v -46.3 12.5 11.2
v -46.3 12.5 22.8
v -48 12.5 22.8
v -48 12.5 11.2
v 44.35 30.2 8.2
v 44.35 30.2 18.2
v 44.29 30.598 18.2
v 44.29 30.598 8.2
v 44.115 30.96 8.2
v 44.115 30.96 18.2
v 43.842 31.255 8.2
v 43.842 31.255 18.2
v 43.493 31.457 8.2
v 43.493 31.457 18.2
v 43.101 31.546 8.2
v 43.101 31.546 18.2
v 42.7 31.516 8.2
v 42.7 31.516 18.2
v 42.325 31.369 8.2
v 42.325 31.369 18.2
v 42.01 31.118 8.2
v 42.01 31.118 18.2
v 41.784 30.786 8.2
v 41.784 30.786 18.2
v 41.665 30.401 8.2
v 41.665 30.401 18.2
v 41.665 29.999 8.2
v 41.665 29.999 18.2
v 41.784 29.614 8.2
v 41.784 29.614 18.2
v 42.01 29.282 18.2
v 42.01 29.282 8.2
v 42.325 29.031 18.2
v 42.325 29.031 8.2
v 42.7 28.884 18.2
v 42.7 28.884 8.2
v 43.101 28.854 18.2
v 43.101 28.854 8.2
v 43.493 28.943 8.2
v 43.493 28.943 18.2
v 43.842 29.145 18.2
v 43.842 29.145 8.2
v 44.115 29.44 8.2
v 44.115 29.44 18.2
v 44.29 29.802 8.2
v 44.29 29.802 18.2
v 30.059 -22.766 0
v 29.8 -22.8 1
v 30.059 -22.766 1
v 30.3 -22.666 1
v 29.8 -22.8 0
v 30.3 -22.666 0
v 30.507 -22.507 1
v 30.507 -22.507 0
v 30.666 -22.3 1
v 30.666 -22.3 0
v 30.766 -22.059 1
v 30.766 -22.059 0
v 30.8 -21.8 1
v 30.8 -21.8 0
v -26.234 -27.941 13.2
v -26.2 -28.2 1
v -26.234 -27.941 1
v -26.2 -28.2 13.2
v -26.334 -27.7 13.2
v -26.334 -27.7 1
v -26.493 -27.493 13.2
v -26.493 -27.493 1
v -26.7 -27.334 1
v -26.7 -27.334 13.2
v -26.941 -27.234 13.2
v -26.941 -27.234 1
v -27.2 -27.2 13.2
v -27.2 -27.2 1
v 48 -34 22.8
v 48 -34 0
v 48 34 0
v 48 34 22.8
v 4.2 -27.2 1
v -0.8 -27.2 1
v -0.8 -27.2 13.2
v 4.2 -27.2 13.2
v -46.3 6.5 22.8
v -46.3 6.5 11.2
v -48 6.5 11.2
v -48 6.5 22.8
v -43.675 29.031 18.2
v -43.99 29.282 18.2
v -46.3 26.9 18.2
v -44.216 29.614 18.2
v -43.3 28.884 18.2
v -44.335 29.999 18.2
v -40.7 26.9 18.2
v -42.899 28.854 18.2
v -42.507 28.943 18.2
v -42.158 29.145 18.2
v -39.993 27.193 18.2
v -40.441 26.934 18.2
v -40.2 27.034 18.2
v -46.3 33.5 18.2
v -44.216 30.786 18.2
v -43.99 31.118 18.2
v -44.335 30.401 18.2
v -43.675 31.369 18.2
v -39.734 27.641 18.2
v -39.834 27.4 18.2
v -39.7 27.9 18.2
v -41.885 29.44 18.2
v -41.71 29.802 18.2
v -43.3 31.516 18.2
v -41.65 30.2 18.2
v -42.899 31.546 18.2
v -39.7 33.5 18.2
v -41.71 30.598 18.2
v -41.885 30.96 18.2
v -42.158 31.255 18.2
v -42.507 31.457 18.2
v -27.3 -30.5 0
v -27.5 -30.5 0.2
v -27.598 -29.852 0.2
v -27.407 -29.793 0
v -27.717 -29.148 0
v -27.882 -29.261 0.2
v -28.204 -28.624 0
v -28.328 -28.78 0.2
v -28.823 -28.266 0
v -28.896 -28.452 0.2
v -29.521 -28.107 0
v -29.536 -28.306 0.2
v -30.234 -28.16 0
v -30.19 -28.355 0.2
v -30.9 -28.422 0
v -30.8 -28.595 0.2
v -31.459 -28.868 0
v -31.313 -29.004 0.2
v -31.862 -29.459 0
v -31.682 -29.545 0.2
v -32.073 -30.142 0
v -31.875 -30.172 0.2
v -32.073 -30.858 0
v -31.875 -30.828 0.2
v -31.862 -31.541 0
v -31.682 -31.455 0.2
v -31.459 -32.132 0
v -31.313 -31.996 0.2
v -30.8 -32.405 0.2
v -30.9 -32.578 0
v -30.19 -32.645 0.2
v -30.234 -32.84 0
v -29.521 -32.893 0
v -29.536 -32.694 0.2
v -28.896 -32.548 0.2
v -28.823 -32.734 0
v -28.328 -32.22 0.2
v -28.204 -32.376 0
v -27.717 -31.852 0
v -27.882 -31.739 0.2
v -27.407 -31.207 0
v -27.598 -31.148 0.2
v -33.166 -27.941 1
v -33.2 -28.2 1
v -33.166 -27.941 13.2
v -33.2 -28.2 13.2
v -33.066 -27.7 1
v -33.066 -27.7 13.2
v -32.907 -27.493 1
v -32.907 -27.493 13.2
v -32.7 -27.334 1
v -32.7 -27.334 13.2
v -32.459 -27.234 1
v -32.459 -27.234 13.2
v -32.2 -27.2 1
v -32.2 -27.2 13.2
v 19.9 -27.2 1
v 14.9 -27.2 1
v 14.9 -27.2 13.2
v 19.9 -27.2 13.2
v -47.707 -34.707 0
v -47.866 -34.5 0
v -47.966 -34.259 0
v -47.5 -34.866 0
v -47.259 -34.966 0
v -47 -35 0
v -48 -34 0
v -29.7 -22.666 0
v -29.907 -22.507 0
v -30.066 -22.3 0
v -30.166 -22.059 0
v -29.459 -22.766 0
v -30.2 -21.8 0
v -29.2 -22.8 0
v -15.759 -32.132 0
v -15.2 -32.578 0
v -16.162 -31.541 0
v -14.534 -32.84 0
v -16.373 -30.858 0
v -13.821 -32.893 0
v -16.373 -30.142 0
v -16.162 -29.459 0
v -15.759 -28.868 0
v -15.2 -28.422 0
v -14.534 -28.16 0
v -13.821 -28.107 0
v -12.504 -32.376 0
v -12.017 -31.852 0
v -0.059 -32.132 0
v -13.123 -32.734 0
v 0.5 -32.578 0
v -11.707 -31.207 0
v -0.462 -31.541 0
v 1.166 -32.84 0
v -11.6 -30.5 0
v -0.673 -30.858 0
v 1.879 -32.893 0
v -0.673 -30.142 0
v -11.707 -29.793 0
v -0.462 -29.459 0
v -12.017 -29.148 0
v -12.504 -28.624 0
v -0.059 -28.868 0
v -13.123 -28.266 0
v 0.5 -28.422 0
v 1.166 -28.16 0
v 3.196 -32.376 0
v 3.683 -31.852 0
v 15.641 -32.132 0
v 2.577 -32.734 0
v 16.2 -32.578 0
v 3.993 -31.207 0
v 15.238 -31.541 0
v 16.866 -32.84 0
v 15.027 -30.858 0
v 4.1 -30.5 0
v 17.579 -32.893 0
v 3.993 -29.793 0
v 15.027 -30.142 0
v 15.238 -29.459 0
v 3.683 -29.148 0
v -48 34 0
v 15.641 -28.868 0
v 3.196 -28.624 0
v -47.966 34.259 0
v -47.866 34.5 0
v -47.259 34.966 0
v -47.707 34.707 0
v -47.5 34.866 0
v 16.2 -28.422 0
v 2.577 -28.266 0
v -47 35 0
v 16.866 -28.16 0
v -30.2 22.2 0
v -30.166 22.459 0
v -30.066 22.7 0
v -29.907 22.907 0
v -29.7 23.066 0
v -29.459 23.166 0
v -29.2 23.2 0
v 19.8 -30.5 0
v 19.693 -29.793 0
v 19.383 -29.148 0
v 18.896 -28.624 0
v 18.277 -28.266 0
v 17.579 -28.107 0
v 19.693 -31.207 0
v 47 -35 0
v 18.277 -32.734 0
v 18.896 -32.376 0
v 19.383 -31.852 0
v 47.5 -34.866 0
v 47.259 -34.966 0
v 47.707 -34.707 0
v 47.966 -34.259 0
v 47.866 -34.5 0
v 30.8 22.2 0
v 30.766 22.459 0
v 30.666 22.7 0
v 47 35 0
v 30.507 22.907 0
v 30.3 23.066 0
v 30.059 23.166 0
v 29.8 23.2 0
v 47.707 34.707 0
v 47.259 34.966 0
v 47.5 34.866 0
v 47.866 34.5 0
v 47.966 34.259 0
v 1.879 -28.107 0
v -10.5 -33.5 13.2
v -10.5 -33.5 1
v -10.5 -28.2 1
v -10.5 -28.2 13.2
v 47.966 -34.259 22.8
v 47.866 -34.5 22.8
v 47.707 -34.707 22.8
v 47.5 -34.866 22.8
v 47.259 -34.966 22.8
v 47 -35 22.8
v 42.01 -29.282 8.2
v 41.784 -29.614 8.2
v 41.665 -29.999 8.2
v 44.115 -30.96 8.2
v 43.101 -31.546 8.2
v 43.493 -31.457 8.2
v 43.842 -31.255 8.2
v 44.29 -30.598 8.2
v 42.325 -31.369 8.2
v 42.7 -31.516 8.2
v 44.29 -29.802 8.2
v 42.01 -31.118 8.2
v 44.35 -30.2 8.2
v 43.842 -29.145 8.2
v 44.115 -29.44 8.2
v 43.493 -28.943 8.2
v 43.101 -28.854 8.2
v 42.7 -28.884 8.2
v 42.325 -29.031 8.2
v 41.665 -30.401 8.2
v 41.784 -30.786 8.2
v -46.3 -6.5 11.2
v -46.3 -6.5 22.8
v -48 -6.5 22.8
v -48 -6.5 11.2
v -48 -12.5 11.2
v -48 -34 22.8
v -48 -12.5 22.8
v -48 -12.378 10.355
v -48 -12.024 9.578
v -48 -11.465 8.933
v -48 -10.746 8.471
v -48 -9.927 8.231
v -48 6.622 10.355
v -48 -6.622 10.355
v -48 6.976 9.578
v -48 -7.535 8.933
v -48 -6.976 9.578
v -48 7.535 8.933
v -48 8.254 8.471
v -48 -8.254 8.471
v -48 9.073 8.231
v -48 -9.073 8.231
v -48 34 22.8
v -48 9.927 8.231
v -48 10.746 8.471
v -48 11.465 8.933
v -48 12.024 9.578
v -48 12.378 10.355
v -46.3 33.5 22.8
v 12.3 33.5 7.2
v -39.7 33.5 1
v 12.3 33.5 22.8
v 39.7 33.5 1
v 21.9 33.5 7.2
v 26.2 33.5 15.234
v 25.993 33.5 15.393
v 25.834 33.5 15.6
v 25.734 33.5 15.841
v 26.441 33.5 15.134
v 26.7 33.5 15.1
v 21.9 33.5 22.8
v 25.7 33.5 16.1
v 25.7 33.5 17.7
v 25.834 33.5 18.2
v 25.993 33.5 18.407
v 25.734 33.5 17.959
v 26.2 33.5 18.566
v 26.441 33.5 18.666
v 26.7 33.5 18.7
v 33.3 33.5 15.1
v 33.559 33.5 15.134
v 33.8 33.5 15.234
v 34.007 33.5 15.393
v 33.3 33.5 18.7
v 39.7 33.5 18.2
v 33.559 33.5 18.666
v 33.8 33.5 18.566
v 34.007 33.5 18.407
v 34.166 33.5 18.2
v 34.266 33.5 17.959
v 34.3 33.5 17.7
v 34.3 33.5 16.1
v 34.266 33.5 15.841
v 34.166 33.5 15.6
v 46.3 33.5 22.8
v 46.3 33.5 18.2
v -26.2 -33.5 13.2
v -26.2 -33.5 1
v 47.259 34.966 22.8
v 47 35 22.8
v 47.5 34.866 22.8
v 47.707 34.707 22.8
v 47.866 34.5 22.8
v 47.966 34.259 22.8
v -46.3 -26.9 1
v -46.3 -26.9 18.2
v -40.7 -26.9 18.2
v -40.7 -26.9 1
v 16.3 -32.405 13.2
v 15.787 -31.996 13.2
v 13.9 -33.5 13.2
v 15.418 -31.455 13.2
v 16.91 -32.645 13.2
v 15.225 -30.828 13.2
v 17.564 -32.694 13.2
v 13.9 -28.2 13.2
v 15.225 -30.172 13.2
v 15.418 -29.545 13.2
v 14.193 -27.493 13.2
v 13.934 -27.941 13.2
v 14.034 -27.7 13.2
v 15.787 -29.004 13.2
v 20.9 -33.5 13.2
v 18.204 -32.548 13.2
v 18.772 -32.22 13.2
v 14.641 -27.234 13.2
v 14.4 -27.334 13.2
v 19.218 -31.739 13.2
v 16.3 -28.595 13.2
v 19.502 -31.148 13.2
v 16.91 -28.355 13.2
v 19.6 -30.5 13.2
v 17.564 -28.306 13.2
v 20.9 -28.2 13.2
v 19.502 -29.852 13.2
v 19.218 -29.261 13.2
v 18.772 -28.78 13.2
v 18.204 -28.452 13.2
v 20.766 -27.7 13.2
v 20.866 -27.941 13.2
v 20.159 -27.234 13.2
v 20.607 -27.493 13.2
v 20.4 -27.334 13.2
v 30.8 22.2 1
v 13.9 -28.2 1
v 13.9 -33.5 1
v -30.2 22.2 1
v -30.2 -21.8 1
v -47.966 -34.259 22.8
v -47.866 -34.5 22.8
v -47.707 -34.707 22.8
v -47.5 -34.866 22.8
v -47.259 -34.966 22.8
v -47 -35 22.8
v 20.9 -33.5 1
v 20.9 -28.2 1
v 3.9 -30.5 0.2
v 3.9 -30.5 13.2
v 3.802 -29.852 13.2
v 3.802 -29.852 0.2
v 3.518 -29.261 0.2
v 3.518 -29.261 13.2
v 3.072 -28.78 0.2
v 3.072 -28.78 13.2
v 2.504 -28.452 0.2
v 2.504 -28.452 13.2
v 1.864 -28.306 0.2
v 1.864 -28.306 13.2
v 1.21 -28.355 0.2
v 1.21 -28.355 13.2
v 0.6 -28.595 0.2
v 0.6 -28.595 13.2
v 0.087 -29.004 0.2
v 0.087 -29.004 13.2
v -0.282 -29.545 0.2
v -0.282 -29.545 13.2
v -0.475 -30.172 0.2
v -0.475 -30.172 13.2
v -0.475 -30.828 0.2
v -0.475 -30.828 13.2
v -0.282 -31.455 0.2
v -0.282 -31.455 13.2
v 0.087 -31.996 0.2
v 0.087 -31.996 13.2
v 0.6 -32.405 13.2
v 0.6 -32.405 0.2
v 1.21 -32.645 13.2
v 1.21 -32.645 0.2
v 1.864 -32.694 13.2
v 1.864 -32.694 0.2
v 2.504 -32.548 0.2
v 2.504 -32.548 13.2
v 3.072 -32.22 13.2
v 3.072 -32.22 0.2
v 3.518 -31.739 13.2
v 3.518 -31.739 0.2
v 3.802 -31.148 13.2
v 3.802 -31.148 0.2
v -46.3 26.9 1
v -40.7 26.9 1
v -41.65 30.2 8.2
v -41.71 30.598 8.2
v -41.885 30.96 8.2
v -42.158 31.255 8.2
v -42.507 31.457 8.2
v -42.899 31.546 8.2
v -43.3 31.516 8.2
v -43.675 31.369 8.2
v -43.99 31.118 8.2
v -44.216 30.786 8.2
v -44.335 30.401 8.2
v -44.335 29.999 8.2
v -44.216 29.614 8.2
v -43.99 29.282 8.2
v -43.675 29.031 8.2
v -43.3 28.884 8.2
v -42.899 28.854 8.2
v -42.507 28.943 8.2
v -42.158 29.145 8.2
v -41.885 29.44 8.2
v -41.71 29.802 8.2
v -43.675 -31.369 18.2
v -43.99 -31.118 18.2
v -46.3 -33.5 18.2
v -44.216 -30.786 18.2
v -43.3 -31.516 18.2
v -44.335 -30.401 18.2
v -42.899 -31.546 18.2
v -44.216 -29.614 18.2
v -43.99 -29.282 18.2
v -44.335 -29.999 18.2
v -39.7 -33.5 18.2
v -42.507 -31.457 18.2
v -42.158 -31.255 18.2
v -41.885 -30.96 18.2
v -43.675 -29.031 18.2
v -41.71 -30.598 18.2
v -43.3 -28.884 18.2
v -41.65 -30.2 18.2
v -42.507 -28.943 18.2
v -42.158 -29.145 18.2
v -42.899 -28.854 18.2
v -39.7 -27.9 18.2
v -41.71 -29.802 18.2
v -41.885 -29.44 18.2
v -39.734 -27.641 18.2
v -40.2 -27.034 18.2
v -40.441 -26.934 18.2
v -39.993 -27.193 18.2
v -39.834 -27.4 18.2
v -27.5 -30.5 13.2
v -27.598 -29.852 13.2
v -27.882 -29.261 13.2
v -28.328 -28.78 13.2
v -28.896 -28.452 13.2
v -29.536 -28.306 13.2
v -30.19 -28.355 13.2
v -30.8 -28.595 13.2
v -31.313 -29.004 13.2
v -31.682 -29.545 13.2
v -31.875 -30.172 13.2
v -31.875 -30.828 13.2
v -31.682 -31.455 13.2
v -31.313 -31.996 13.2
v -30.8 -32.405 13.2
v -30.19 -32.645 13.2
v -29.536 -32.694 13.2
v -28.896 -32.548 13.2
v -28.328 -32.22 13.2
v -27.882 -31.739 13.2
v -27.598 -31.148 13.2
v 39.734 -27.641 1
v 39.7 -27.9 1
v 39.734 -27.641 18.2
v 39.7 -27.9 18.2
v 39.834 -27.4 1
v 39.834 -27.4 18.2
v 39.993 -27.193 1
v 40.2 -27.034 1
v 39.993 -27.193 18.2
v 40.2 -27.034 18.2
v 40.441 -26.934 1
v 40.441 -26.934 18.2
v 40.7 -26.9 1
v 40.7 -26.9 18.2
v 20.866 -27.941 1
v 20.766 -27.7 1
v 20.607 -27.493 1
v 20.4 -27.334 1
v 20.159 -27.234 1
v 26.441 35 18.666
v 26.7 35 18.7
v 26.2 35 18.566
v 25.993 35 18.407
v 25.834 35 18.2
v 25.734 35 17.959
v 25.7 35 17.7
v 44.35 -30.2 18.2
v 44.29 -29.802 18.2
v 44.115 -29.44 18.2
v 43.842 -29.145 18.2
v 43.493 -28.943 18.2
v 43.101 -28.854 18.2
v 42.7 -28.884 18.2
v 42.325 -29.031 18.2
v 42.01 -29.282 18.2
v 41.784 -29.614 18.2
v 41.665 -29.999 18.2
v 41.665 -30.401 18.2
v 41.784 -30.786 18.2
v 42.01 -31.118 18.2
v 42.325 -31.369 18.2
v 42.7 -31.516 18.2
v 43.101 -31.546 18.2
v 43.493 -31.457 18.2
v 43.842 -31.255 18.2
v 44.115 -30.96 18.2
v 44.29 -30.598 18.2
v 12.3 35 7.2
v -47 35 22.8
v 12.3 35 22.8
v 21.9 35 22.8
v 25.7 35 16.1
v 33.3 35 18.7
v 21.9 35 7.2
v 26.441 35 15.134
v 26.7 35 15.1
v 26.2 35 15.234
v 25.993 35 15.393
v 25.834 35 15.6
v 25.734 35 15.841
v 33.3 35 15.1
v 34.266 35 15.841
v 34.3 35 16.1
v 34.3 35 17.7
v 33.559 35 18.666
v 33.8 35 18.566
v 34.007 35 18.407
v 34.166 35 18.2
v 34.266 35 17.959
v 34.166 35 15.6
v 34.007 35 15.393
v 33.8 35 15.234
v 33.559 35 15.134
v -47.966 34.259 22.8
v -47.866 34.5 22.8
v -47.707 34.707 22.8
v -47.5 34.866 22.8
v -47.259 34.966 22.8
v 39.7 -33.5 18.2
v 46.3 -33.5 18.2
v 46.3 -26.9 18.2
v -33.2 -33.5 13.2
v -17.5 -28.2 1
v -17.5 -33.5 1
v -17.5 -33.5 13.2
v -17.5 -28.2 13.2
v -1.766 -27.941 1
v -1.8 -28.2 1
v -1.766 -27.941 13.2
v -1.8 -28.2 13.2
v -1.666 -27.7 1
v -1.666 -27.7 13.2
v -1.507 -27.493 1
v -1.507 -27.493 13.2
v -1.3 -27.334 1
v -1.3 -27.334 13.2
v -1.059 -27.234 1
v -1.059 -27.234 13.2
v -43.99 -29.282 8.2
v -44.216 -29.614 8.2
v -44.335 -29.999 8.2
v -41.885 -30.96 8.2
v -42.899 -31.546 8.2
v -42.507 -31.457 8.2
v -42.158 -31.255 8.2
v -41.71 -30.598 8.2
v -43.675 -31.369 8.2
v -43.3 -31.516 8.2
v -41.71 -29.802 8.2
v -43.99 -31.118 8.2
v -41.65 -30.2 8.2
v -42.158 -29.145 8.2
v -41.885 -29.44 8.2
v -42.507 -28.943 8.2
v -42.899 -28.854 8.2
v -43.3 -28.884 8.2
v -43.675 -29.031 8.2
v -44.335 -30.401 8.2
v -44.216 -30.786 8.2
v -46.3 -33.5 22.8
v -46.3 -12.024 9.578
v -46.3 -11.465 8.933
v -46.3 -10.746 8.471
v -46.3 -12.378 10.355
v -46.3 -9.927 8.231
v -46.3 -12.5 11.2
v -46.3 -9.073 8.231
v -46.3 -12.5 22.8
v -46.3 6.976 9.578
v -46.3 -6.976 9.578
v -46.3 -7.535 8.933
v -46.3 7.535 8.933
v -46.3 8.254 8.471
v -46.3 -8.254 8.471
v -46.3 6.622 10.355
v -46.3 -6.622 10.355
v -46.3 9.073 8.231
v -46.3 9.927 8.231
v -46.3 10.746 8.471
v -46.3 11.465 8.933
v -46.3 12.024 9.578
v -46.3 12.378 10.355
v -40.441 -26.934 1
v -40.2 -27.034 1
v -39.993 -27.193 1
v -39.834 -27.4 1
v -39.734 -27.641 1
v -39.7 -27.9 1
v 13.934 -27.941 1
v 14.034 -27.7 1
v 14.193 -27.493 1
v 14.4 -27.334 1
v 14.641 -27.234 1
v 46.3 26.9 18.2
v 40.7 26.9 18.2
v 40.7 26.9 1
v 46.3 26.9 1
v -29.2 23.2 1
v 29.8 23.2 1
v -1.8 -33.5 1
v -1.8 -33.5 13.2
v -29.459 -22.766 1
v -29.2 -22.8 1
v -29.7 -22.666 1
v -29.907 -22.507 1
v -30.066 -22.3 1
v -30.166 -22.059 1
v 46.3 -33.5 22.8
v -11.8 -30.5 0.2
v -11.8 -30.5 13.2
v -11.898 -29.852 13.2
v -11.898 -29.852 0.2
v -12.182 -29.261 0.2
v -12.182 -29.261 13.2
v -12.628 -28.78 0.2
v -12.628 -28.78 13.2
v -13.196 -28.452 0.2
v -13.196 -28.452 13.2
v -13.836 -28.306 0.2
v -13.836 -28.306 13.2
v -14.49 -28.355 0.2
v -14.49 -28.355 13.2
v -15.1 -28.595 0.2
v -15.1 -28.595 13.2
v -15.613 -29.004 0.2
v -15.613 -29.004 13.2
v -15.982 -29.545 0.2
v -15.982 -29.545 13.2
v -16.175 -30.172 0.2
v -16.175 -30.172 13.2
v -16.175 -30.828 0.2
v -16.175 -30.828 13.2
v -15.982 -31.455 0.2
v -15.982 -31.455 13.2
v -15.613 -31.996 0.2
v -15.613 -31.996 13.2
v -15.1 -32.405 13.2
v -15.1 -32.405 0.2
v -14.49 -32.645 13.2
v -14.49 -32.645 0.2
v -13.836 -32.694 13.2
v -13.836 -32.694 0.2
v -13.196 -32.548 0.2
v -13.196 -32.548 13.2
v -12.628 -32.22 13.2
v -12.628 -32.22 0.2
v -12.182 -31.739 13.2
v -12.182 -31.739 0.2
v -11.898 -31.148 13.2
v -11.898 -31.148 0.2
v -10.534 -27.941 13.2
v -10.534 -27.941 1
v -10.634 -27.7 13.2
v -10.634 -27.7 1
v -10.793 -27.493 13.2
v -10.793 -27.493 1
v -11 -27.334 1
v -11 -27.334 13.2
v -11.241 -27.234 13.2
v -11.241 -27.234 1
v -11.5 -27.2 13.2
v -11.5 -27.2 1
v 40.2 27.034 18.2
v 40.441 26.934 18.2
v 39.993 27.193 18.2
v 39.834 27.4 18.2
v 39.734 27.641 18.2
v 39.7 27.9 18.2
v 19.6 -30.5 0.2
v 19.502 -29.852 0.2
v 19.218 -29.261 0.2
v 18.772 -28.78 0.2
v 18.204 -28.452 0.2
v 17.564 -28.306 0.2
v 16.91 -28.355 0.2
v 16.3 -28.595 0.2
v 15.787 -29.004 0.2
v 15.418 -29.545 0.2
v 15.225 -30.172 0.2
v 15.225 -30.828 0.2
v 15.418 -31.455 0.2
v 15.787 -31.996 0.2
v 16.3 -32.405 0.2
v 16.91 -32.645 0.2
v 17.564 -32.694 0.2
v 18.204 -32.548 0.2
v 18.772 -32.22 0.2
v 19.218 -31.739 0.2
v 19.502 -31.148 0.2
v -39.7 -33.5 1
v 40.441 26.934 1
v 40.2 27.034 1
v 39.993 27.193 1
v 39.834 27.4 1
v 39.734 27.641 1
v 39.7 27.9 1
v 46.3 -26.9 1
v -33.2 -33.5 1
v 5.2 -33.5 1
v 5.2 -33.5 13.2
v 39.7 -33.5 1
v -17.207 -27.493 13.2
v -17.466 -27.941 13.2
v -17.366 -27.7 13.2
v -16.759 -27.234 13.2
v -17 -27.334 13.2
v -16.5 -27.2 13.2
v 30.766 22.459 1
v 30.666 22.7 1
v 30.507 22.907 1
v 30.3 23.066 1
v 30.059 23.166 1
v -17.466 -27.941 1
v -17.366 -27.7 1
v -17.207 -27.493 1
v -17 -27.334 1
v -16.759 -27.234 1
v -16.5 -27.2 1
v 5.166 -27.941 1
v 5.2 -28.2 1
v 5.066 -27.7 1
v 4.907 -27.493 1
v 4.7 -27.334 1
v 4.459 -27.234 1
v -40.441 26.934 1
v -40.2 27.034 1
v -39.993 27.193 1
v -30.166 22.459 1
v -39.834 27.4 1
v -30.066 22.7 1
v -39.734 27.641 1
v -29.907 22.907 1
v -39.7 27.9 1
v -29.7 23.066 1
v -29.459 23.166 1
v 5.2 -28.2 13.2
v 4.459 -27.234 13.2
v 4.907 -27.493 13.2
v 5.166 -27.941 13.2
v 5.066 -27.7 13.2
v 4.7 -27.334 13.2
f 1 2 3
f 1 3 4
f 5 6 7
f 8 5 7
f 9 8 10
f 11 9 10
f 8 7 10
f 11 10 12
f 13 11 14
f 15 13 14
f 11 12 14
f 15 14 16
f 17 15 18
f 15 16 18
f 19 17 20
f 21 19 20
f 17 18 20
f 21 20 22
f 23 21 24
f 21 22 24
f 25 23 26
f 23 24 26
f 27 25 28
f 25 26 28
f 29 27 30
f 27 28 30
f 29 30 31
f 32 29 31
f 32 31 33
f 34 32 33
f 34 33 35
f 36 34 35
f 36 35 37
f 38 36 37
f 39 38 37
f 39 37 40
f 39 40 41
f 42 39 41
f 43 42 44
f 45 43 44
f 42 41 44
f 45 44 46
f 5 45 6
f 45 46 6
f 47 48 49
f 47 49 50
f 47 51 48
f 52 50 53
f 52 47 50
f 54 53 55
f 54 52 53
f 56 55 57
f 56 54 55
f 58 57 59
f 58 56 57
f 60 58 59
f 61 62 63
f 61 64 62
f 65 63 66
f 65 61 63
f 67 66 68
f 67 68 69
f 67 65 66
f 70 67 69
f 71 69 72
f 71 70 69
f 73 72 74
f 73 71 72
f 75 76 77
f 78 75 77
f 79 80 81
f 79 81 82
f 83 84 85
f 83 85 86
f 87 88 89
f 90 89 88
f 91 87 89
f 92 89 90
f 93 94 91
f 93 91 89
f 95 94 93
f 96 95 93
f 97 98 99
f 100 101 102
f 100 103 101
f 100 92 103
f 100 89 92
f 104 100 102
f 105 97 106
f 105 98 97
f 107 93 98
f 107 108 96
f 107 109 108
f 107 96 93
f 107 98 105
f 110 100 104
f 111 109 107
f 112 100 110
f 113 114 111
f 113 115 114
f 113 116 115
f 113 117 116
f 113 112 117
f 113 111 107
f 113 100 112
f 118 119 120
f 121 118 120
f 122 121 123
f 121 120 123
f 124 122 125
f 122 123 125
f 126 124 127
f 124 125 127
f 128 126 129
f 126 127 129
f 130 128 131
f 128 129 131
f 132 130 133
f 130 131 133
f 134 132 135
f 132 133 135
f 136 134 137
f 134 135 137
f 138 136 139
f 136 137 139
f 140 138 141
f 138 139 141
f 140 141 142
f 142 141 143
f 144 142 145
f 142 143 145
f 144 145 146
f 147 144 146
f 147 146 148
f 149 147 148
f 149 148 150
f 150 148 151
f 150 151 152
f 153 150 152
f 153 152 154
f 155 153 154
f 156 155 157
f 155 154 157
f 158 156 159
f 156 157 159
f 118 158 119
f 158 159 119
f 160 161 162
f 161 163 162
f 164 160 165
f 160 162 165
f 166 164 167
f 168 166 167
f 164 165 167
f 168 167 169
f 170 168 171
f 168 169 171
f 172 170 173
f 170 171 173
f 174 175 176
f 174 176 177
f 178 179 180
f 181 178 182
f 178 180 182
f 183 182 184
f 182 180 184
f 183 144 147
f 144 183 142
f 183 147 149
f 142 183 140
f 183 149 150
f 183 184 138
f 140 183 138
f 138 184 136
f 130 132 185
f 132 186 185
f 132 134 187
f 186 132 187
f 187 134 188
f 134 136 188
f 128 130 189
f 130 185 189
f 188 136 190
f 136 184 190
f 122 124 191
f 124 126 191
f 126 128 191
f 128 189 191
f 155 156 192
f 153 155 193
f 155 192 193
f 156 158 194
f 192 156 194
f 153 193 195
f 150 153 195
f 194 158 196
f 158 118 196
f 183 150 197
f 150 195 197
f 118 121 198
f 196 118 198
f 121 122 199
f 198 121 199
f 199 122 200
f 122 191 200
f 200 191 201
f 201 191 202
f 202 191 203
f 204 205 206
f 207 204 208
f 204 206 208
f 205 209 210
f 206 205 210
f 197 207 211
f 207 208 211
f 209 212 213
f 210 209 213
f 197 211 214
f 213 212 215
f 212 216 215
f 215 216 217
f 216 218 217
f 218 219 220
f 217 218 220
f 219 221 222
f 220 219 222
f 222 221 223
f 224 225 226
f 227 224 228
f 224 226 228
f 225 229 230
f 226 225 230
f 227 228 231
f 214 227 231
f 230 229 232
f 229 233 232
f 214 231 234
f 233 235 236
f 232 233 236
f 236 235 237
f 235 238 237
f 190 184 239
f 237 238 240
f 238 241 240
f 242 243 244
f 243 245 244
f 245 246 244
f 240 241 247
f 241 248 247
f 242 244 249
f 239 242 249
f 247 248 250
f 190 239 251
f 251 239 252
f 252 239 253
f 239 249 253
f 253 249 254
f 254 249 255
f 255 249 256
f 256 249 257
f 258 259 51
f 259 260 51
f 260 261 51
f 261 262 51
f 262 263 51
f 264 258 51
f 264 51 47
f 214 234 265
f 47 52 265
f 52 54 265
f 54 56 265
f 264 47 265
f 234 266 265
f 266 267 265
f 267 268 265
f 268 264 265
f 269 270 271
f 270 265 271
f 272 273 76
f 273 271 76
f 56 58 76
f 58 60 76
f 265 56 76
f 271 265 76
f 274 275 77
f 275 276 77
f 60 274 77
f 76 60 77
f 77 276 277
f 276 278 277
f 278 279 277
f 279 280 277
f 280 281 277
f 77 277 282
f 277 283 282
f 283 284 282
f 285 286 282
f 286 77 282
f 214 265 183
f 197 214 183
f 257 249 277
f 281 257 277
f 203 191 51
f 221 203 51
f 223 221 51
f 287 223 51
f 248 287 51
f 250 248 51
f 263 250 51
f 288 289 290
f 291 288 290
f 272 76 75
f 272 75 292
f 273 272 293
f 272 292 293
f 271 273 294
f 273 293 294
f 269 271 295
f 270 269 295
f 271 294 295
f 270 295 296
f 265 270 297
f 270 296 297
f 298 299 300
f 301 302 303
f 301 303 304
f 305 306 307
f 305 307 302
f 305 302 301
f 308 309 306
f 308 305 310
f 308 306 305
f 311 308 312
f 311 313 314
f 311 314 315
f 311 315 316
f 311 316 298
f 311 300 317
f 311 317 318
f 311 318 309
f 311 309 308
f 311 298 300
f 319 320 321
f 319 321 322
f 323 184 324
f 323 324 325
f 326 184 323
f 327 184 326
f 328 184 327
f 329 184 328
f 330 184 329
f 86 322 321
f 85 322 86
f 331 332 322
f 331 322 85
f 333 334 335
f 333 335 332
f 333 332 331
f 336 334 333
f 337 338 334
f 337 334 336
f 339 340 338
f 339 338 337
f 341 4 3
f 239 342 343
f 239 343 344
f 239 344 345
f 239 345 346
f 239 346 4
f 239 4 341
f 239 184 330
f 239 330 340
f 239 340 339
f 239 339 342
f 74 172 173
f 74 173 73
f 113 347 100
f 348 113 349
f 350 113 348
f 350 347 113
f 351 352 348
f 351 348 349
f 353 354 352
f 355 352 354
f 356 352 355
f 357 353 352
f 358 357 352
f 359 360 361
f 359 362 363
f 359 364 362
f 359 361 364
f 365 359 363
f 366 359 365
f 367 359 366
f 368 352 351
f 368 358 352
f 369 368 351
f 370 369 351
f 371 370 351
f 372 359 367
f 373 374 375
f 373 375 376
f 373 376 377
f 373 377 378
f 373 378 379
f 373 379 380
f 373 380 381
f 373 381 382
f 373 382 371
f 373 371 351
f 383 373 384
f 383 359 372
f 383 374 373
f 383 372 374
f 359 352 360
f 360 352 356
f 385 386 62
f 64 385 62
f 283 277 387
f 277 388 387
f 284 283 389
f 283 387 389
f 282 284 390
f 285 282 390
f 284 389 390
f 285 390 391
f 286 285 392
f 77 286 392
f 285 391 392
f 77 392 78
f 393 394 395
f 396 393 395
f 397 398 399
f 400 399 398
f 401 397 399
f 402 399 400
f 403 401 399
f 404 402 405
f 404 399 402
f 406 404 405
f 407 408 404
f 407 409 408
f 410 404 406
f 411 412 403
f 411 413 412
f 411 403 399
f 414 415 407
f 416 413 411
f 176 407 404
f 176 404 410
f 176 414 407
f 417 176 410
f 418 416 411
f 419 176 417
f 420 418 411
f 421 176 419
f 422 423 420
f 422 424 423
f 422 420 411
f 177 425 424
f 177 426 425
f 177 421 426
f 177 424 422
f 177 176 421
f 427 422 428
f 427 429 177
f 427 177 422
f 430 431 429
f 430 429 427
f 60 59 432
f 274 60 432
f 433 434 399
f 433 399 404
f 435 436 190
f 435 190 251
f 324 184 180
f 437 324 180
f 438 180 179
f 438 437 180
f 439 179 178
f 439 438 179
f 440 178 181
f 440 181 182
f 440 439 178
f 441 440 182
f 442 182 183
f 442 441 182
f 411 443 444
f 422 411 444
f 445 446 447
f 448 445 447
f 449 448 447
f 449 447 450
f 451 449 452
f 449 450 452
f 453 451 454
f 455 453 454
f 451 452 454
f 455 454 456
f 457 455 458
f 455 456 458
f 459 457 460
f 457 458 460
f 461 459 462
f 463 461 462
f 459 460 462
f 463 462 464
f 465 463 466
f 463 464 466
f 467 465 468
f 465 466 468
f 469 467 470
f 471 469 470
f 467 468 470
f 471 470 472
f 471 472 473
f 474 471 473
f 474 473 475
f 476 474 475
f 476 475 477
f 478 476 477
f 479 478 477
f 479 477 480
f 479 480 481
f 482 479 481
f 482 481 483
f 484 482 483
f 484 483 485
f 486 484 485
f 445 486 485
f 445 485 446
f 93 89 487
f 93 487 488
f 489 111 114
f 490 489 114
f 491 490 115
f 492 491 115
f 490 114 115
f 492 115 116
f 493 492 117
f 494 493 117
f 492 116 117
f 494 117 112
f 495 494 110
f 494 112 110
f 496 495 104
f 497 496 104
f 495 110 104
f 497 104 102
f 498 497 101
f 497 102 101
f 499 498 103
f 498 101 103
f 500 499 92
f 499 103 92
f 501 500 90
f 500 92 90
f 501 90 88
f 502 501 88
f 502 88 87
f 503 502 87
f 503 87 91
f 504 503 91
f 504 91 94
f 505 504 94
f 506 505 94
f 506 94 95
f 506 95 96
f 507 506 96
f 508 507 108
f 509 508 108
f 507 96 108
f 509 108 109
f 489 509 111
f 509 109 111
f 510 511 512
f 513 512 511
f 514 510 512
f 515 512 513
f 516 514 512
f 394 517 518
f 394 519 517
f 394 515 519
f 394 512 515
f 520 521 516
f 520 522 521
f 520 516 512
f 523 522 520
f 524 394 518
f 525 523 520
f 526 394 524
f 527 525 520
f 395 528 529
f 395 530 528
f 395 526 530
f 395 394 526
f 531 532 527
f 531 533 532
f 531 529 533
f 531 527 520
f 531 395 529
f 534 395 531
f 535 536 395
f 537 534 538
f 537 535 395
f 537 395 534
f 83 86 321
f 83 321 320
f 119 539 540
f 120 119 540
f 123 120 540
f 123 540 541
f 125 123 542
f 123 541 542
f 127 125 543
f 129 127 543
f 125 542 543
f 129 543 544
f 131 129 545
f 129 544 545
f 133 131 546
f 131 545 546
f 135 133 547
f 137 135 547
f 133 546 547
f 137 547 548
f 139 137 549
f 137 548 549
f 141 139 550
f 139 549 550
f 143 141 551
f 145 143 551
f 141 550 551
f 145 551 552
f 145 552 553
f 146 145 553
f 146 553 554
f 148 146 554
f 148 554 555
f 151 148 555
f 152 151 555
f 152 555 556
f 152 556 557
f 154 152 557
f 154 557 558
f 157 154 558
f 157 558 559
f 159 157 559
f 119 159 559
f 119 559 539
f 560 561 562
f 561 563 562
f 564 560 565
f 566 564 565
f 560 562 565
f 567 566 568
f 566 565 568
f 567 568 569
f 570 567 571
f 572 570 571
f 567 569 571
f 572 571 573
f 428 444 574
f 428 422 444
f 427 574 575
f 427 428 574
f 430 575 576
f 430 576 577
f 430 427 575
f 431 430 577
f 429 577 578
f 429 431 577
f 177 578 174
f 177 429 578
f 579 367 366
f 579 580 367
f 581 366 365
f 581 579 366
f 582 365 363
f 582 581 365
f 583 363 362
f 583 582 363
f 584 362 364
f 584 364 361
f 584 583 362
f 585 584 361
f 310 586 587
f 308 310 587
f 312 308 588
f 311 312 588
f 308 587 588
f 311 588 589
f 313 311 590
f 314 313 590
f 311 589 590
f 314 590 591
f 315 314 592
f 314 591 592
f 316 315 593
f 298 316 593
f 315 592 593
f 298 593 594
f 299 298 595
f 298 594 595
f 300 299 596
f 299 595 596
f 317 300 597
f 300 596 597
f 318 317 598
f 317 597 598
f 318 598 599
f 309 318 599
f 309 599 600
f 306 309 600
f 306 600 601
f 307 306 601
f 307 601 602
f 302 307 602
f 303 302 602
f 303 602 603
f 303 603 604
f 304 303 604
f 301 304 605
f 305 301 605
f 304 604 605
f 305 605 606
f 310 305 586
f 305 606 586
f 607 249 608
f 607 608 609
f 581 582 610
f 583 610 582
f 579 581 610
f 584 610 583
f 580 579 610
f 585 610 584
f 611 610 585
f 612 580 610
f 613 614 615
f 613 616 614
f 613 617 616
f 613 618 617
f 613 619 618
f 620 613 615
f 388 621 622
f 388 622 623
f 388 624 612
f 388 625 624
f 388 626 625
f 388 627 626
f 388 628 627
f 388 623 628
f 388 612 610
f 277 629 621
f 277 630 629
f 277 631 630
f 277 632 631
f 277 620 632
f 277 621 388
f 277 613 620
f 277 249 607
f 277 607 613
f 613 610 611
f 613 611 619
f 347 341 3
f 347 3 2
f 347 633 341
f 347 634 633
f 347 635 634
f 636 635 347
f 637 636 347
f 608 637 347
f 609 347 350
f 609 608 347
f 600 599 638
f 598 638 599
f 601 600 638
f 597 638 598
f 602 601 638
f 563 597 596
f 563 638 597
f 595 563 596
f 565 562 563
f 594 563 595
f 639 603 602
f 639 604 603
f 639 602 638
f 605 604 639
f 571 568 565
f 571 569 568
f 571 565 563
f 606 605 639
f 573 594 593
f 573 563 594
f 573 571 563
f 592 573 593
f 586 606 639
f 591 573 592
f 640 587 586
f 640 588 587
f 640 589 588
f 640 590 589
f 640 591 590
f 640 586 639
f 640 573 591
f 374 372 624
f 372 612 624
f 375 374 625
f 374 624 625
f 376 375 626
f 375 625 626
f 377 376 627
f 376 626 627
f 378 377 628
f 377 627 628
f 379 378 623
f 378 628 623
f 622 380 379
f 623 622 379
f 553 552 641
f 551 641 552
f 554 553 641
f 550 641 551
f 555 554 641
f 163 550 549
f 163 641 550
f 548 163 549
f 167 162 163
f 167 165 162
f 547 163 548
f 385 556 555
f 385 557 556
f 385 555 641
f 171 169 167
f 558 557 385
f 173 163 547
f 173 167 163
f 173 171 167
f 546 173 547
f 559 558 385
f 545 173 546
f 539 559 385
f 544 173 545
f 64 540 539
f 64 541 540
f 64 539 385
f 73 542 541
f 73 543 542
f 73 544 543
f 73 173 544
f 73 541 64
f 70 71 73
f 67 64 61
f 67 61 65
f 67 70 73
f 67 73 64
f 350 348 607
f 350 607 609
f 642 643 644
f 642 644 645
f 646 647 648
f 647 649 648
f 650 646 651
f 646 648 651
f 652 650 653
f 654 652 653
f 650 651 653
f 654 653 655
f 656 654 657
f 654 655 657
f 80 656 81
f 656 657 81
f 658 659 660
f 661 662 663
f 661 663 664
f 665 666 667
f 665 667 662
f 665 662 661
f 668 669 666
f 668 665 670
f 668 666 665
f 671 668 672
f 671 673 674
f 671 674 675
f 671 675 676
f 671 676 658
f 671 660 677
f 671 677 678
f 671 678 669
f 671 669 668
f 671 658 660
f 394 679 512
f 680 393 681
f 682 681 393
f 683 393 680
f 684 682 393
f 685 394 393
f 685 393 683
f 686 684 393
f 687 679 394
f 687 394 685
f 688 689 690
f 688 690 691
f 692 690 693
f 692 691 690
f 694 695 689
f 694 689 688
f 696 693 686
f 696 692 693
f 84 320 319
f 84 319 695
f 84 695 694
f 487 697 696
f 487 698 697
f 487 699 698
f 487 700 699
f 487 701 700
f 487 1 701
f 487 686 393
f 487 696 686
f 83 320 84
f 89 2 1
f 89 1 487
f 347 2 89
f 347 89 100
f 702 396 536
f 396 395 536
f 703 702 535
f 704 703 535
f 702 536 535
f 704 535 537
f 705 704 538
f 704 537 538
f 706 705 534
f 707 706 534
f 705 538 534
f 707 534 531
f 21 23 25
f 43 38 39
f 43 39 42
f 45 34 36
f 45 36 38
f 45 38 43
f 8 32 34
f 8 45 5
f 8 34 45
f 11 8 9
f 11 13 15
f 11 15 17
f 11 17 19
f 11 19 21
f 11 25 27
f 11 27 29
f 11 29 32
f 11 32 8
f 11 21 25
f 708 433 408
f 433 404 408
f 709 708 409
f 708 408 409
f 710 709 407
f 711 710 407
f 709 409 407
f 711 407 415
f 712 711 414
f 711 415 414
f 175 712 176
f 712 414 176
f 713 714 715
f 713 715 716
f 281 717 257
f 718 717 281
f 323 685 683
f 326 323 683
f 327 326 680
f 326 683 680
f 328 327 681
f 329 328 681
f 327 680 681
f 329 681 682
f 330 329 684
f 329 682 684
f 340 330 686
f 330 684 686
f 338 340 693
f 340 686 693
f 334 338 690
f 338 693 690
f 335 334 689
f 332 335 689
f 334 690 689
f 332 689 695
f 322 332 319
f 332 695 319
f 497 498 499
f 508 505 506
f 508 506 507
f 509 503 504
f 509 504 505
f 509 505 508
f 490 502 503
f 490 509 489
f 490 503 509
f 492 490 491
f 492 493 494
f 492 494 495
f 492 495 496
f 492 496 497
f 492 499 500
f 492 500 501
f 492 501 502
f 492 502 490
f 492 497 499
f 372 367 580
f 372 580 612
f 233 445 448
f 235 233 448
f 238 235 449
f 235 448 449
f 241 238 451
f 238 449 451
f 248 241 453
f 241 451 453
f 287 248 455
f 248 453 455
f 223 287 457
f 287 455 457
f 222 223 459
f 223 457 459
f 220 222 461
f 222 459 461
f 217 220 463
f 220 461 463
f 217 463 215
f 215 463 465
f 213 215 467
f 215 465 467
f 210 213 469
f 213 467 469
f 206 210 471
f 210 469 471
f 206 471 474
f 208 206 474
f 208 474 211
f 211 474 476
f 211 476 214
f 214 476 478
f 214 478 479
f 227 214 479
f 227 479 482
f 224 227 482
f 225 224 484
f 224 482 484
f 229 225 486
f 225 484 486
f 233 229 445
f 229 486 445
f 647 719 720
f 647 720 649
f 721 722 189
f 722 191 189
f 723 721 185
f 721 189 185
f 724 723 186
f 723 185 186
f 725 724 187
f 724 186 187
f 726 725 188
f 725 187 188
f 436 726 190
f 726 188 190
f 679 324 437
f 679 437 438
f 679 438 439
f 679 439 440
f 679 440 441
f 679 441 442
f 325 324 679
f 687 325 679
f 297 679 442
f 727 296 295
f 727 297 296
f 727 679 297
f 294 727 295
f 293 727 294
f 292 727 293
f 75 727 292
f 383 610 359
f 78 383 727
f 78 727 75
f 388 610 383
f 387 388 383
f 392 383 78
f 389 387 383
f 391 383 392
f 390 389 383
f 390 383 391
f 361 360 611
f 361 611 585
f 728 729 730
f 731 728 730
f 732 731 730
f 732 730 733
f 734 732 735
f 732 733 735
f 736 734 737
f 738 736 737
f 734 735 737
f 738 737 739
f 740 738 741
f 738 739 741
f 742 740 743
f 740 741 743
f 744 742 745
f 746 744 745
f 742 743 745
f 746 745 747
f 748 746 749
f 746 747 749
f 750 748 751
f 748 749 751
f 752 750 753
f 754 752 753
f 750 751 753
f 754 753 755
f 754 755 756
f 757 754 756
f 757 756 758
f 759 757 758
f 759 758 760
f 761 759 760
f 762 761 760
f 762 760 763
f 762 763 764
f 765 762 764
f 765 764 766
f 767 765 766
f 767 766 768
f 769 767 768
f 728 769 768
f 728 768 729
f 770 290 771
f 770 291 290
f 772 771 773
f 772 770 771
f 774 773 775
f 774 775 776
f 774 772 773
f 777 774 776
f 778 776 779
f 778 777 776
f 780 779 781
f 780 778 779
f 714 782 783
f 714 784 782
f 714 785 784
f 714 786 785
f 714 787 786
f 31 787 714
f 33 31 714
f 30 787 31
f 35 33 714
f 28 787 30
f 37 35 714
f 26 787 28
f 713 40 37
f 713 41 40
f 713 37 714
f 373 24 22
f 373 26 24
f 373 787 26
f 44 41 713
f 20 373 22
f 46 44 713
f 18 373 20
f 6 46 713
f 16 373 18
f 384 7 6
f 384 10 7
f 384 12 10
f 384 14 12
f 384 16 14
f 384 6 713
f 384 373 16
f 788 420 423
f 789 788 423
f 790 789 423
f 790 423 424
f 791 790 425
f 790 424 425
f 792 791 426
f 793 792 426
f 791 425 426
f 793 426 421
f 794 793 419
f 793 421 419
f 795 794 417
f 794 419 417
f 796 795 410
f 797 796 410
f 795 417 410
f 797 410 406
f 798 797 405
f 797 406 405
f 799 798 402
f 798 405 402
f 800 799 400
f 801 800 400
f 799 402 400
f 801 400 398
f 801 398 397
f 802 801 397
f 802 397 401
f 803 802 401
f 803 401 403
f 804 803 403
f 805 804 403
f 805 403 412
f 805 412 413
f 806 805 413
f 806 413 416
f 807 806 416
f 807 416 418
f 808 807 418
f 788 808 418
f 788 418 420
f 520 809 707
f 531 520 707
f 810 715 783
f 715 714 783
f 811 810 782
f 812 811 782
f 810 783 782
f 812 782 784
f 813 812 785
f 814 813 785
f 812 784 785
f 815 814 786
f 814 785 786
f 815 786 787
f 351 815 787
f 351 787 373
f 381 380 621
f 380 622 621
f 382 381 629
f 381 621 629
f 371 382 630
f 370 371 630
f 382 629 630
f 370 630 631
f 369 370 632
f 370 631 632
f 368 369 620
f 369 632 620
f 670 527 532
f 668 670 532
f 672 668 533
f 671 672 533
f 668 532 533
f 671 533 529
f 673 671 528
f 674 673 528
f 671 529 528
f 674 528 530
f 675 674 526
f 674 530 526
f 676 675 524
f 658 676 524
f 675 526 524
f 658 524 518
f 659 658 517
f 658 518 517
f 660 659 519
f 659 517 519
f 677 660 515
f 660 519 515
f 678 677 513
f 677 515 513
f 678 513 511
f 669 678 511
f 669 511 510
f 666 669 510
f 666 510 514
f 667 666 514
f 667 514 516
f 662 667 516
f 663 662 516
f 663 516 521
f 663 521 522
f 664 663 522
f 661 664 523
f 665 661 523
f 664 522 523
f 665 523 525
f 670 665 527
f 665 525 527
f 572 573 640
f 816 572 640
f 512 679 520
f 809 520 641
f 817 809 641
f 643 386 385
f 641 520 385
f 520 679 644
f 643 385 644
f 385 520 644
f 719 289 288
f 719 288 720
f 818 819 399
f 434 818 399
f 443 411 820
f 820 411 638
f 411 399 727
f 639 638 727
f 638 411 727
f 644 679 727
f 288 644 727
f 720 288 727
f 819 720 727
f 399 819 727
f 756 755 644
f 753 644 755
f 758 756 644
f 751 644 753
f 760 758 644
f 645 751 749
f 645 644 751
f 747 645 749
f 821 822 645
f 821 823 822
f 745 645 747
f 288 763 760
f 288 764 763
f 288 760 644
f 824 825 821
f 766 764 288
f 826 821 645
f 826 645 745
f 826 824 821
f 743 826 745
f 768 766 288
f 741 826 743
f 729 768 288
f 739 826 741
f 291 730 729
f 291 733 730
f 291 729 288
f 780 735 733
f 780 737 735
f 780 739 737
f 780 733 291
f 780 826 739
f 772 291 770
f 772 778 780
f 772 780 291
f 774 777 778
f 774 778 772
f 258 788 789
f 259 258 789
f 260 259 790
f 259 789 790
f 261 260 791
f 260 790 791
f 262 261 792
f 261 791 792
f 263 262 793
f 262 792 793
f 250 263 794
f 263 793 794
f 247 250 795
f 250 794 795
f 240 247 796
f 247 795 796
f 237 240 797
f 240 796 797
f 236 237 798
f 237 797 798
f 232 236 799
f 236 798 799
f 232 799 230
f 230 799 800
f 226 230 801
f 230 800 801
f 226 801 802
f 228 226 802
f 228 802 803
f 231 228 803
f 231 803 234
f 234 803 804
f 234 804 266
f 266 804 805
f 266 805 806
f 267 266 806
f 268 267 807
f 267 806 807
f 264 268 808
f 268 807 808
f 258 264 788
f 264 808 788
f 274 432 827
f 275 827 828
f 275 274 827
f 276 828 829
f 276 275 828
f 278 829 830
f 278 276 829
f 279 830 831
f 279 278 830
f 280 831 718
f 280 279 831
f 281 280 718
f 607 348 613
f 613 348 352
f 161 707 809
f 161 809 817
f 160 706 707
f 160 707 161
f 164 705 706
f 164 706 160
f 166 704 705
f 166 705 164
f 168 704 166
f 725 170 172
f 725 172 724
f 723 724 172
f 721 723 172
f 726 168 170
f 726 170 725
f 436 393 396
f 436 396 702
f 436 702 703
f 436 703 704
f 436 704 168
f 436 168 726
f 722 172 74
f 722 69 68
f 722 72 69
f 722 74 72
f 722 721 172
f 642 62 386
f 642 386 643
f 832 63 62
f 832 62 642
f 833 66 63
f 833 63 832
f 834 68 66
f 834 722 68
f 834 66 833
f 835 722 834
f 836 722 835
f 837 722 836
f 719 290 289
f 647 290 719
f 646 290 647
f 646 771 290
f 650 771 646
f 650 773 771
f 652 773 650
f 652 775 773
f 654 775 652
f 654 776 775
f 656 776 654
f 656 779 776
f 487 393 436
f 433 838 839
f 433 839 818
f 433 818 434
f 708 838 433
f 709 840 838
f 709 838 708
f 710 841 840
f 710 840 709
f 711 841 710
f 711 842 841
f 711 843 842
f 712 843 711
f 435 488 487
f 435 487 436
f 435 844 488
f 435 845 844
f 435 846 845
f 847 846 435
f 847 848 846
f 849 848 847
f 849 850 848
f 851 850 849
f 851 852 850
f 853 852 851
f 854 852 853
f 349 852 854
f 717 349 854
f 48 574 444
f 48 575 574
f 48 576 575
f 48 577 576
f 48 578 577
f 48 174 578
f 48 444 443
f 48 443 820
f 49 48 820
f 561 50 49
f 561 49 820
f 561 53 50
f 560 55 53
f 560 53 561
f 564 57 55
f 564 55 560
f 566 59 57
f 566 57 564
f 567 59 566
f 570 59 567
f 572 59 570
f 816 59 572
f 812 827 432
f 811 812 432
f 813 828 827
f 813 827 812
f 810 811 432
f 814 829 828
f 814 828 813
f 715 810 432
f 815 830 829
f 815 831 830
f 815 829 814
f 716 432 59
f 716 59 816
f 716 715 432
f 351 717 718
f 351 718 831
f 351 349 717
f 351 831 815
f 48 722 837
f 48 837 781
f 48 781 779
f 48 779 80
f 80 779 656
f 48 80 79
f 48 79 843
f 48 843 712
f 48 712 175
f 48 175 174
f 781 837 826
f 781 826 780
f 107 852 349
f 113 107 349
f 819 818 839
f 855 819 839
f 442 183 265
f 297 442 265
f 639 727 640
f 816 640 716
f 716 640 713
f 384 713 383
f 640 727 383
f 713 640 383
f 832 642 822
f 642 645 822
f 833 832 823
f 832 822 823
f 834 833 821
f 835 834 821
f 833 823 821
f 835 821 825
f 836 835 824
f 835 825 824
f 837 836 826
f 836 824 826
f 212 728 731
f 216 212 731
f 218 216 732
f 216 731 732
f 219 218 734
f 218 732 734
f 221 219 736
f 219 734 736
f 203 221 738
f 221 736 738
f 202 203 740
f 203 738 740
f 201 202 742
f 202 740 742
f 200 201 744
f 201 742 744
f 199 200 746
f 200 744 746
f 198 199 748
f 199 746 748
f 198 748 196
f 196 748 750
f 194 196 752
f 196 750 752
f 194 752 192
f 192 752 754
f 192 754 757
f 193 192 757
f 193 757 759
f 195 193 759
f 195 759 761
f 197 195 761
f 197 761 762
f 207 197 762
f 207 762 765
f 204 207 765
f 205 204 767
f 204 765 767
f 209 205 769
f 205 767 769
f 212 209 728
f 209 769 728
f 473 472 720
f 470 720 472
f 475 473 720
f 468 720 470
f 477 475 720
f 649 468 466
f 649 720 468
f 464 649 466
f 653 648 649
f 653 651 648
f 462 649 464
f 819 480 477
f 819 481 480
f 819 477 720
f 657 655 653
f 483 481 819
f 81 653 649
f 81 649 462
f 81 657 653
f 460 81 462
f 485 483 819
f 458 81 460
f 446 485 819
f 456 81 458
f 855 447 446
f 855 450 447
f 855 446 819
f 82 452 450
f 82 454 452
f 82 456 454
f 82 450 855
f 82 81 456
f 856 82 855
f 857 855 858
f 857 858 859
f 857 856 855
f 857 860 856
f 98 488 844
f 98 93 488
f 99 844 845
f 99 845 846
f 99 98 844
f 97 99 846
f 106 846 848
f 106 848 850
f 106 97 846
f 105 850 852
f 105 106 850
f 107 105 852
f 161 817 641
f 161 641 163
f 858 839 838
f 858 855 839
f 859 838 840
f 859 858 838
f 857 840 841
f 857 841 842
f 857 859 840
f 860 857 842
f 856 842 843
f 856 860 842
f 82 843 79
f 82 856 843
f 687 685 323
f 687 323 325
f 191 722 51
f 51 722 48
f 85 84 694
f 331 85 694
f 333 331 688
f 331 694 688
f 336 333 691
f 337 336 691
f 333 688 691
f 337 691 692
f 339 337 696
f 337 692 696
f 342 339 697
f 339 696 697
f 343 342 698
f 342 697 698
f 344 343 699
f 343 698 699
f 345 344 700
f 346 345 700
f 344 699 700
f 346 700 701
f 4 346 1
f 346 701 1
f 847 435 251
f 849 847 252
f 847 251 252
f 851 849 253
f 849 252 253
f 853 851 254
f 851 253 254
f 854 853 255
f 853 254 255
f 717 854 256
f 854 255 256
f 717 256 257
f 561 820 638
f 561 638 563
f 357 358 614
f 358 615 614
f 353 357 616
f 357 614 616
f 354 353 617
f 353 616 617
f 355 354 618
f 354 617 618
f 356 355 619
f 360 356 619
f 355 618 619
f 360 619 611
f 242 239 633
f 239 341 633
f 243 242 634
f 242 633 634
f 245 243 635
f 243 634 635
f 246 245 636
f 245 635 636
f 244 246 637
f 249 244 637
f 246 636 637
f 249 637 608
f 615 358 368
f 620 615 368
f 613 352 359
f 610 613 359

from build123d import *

# Parameters (mm, degrees)
SKETCH_W        = 96
SKETCH_H        = 70
PAD_DEPTH       = 22.8
SKETCH001_W     = 92.6
SKETCH001_H     = 67
POCKET_DEPTH    = 21.8
SKETCH002_W     = 6.6
SKETCH002_H     = 6.6
PAD001_DEPTH    = 17.2
SKETCH003_W     = 61
SKETCH003_H     = 46
POCKET001_DEPTH = 1.001
SKETCH004_R     = 1.35
POCKET002_DEPTH = 10
SKETCH005_R     = 1.35
POCKET003_DEPTH = 10
SKETCH006_R     = 1.35
POCKET004_DEPTH = 10
SKETCH007_R     = 1.35
POCKET005_DEPTH = 10
POCKET006_DEPTH = 1.701
SKETCH009_W     = 7
SKETCH009_H     = 6.3
PAD002_DEPTH    = 12.2
SKETCH010_R     = 2.2
POCKET007_DEPTH = 13.201
SKETCH011_R     = 2.2
POCKET008_DEPTH = 13.201
SKETCH012_R     = 2.2
POCKET009_DEPTH = 13.201
SKETCH013_R     = 2.2
POCKET010_DEPTH = 13.201
SKETCH014_W     = 9.6
SKETCH014_H     = 15.6
POCKET011_DEPTH = 1.501
SKETCH015_W     = 8.6
SKETCH015_H     = 3.6
POCKET012_DEPTH = 1.501
FILLET_R        = 1
FILLET001_R     = 1
CHAMFER_SIZE    = 0.2
FILLET002_R     = 1
FILLET003_R     = 1


with BuildPart() as part:
    # Sketch → Pad (new body)
    with BuildSketch(Plane.XY):
        Rectangle(SKETCH_W, SKETCH_H)
    extrude(amount=PAD_DEPTH)

    # Sketch001 (on Face6 of Pad) → Pocket (cut)
    with BuildSketch(Plane.XY.offset(22.8)):
        Rectangle(SKETCH001_W, SKETCH001_H)
    extrude(amount=-POCKET_DEPTH, mode=Mode.SUBTRACT)

    # Sketch002 (on Face11 of Pocket) → Pad001 (join)
    with BuildSketch(Plane.XY.offset(1)):
        with Locations((-43, 30.2)):
            Rectangle(SKETCH002_W, SKETCH002_H)
        with Locations((43, 30.2)):
            Rectangle(SKETCH002_W, SKETCH002_H)
        with Locations((43, -30.2)):
            Rectangle(SKETCH002_W, SKETCH002_H)
        with Locations((-43, -30.2)):
            Rectangle(SKETCH002_W, SKETCH002_H)
    extrude(amount=PAD001_DEPTH)

    # Sketch003 (on Face13 of Pad001) → Pocket001 (cut, through all)
    with BuildSketch(Plane.XY.offset(1)):
        with Locations((0.3, 0.2)):
            Rectangle(SKETCH003_W, SKETCH003_H)
    extrude(amount=-POCKET001_DEPTH, mode=Mode.SUBTRACT)

    # Sketch004 (on Face19 of Pocket001) → Pocket002 (cut)
    with BuildSketch(Plane.XY.offset(18.2)):
        with Locations((-43, 30.2)):
            Circle(SKETCH004_R)
    extrude(amount=-POCKET002_DEPTH, mode=Mode.SUBTRACT)

    # Sketch005 (on Face16 of Pocket002) → Pocket003 (cut)
    with BuildSketch(Plane.XY.offset(18.2)):
        with Locations((43, 30.2)):
            Circle(SKETCH005_R)
    extrude(amount=-POCKET003_DEPTH, mode=Mode.SUBTRACT)

    # Sketch006 (on Face23 of Pocket003) → Pocket004 (cut)
    with BuildSketch(Plane.XY.offset(18.2)):
        with Locations((-43, -30.2)):
            Circle(SKETCH006_R)
    extrude(amount=-POCKET004_DEPTH, mode=Mode.SUBTRACT)

    # Sketch007 (on Face20 of Pocket004) → Pocket005 (cut)
    with BuildSketch(Plane.XY.offset(18.2)):
        with Locations((43, -30.2)):
            Circle(SKETCH007_R)
    extrude(amount=-POCKET005_DEPTH, mode=Mode.SUBTRACT)

    # Sketch008 (on Face14 of Pocket005) → Pocket006 (cut, through all)
    with BuildSketch(Plane.YZ.offset(-46.3)):
        with BuildLine():
            Line((-12.5, 22.8), (-6.5, 22.8))
            Line((-6.5, 22.8), (-6.5, 11.2))
            ThreePointArc((-12.5, 11.2), (-9.5, 8.2), (-6.5, 11.2))
            Line((-12.5, 11.2), (-12.5, 22.8))
        make_face()
        with BuildLine():
            Line((6.5, 22.8), (12.5, 22.8))
            Line((12.5, 22.8), (12.5, 11.2))
            ThreePointArc((6.5, 11.2), (9.5, 8.2), (12.5, 11.2))
            Line((6.5, 11.2), (6.5, 22.8))
        make_face()
    extrude(amount=-POCKET006_DEPTH, mode=Mode.SUBTRACT)

    # Sketch009 (on Face22 of Pocket006) → Pad002 (join)
    with BuildSketch(Plane.XY.offset(1)):
        with Locations((-29.7, -30.35)):
            Rectangle(SKETCH009_W, SKETCH009_H)
        with Locations((-14, -30.35)):
            Rectangle(SKETCH009_W, SKETCH009_H)
        with Locations((1.7, -30.35)):
            Rectangle(SKETCH009_W, SKETCH009_H)
        with Locations((17.4, -30.35)):
            Rectangle(SKETCH009_W, SKETCH009_H)
    extrude(amount=PAD002_DEPTH)

    # Sketch010 (on Face35 of Pad002) → Pocket007 (cut, through all)
    with BuildSketch(Plane.XY.offset(13.2)):
        with Locations((-29.7, -30.5)):
            Circle(SKETCH010_R)
    extrude(amount=-POCKET007_DEPTH, mode=Mode.SUBTRACT)

    # Sketch011 (on Face39 of Pocket007) → Pocket008 (cut, through all)
    with BuildSketch(Plane.XY.offset(13.2)):
        with Locations((-14, -30.5)):
            Circle(SKETCH011_R)
    extrude(amount=-POCKET008_DEPTH, mode=Mode.SUBTRACT)

    # Sketch012 (on Face43 of Pocket008) → Pocket009 (cut, through all)
    with BuildSketch(Plane.XY.offset(13.2)):
        with Locations((1.7, -30.5)):
            Circle(SKETCH012_R)
    extrude(amount=-POCKET009_DEPTH, mode=Mode.SUBTRACT)

    # Sketch013 (on Face47 of Pocket009) → Pocket010 (cut, through all)
    with BuildSketch(Plane.XY.offset(13.2)):
        with Locations((17.4, -30.5)):
            Circle(SKETCH013_R)
    extrude(amount=-POCKET010_DEPTH, mode=Mode.SUBTRACT)

    # Sketch014 (on Face23 of Pocket010) → Pocket011 (cut, through all)
    with BuildSketch(Plane.XZ.offset(-33.5)):
        with Locations((17.1, 15)):
            Rectangle(SKETCH014_W, SKETCH014_H)
    extrude(amount=-POCKET011_DEPTH, mode=Mode.SUBTRACT)

    # Sketch015 (on Face19 of Pocket011) → Pocket012 (cut, through all)
    with BuildSketch(Plane.XZ.offset(-33.5)):
        with Locations((30, 16.9)):
            Rectangle(SKETCH015_W, SKETCH015_H)
    extrude(amount=-POCKET012_DEPTH, mode=Mode.SUBTRACT)

    # Fillet
    fillet_edges = [part.edges().sort_by_distance(p)[0] for p in [
        (48, 35, 11.4),
        (-48, 35, 11.4),
        (-48, -35, 11.4),
        (48, -35, 11.4),
    ]]
    fillet(fillet_edges, radius=FILLET_R)

    # Fillet001
    fillet001_edges = [part.edges().sort_by_distance(p)[0] for p in [
        (-39.7, 26.9, 9.6),
        (39.7, 26.9, 9.6),
        (39.7, -26.9, 9.6),
        (20.9, -27.2, 7.1),
        (13.9, -27.2, 7.1),
        (5.2, -27.2, 7.1),
        (-1.8, -27.2, 7.1),
        (-10.5, -27.2, 7.1),
        (-17.5, -27.2, 7.1),
        (-26.2, -27.2, 7.1),
        (-33.2, -27.2, 7.1),
        (-39.7, -26.9, 9.6),
    ]]
    fillet(fillet001_edges, radius=FILLET001_R)

    # Chamfer
    chamfer_edges = [part.edges().sort_by_distance(p)[0] for p in [
        (15.2, -30.5, 0),
        (-0.5, -30.5, 0),
        (-16.2, -30.5, 0),
        (-31.9, -30.5, 0),
    ]]
    chamfer(chamfer_edges, length=CHAMFER_SIZE)

    # Fillet002
    fillet002_edges = [part.edges().sort_by_distance(p)[0] for p in [
        (34.3, 34.25, 15.1),
        (34.3, 34.25, 18.7),
        (25.7, 34.25, 18.7),
        (25.7, 34.25, 15.1),
    ]]
    fillet(fillet002_edges, radius=FILLET002_R)

    # Fillet003
    fillet003_edges = [part.edges().sort_by_distance(p)[0] for p in [
        (-30.2, 23.2, 0.5),
        (30.8, 23.2, 0.5),
        (30.8, -22.8, 0.5),
        (-30.2, -22.8, 0.5),
    ]]
    fillet(fillet003_edges, radius=FILLET003_R)


solid = part.part
